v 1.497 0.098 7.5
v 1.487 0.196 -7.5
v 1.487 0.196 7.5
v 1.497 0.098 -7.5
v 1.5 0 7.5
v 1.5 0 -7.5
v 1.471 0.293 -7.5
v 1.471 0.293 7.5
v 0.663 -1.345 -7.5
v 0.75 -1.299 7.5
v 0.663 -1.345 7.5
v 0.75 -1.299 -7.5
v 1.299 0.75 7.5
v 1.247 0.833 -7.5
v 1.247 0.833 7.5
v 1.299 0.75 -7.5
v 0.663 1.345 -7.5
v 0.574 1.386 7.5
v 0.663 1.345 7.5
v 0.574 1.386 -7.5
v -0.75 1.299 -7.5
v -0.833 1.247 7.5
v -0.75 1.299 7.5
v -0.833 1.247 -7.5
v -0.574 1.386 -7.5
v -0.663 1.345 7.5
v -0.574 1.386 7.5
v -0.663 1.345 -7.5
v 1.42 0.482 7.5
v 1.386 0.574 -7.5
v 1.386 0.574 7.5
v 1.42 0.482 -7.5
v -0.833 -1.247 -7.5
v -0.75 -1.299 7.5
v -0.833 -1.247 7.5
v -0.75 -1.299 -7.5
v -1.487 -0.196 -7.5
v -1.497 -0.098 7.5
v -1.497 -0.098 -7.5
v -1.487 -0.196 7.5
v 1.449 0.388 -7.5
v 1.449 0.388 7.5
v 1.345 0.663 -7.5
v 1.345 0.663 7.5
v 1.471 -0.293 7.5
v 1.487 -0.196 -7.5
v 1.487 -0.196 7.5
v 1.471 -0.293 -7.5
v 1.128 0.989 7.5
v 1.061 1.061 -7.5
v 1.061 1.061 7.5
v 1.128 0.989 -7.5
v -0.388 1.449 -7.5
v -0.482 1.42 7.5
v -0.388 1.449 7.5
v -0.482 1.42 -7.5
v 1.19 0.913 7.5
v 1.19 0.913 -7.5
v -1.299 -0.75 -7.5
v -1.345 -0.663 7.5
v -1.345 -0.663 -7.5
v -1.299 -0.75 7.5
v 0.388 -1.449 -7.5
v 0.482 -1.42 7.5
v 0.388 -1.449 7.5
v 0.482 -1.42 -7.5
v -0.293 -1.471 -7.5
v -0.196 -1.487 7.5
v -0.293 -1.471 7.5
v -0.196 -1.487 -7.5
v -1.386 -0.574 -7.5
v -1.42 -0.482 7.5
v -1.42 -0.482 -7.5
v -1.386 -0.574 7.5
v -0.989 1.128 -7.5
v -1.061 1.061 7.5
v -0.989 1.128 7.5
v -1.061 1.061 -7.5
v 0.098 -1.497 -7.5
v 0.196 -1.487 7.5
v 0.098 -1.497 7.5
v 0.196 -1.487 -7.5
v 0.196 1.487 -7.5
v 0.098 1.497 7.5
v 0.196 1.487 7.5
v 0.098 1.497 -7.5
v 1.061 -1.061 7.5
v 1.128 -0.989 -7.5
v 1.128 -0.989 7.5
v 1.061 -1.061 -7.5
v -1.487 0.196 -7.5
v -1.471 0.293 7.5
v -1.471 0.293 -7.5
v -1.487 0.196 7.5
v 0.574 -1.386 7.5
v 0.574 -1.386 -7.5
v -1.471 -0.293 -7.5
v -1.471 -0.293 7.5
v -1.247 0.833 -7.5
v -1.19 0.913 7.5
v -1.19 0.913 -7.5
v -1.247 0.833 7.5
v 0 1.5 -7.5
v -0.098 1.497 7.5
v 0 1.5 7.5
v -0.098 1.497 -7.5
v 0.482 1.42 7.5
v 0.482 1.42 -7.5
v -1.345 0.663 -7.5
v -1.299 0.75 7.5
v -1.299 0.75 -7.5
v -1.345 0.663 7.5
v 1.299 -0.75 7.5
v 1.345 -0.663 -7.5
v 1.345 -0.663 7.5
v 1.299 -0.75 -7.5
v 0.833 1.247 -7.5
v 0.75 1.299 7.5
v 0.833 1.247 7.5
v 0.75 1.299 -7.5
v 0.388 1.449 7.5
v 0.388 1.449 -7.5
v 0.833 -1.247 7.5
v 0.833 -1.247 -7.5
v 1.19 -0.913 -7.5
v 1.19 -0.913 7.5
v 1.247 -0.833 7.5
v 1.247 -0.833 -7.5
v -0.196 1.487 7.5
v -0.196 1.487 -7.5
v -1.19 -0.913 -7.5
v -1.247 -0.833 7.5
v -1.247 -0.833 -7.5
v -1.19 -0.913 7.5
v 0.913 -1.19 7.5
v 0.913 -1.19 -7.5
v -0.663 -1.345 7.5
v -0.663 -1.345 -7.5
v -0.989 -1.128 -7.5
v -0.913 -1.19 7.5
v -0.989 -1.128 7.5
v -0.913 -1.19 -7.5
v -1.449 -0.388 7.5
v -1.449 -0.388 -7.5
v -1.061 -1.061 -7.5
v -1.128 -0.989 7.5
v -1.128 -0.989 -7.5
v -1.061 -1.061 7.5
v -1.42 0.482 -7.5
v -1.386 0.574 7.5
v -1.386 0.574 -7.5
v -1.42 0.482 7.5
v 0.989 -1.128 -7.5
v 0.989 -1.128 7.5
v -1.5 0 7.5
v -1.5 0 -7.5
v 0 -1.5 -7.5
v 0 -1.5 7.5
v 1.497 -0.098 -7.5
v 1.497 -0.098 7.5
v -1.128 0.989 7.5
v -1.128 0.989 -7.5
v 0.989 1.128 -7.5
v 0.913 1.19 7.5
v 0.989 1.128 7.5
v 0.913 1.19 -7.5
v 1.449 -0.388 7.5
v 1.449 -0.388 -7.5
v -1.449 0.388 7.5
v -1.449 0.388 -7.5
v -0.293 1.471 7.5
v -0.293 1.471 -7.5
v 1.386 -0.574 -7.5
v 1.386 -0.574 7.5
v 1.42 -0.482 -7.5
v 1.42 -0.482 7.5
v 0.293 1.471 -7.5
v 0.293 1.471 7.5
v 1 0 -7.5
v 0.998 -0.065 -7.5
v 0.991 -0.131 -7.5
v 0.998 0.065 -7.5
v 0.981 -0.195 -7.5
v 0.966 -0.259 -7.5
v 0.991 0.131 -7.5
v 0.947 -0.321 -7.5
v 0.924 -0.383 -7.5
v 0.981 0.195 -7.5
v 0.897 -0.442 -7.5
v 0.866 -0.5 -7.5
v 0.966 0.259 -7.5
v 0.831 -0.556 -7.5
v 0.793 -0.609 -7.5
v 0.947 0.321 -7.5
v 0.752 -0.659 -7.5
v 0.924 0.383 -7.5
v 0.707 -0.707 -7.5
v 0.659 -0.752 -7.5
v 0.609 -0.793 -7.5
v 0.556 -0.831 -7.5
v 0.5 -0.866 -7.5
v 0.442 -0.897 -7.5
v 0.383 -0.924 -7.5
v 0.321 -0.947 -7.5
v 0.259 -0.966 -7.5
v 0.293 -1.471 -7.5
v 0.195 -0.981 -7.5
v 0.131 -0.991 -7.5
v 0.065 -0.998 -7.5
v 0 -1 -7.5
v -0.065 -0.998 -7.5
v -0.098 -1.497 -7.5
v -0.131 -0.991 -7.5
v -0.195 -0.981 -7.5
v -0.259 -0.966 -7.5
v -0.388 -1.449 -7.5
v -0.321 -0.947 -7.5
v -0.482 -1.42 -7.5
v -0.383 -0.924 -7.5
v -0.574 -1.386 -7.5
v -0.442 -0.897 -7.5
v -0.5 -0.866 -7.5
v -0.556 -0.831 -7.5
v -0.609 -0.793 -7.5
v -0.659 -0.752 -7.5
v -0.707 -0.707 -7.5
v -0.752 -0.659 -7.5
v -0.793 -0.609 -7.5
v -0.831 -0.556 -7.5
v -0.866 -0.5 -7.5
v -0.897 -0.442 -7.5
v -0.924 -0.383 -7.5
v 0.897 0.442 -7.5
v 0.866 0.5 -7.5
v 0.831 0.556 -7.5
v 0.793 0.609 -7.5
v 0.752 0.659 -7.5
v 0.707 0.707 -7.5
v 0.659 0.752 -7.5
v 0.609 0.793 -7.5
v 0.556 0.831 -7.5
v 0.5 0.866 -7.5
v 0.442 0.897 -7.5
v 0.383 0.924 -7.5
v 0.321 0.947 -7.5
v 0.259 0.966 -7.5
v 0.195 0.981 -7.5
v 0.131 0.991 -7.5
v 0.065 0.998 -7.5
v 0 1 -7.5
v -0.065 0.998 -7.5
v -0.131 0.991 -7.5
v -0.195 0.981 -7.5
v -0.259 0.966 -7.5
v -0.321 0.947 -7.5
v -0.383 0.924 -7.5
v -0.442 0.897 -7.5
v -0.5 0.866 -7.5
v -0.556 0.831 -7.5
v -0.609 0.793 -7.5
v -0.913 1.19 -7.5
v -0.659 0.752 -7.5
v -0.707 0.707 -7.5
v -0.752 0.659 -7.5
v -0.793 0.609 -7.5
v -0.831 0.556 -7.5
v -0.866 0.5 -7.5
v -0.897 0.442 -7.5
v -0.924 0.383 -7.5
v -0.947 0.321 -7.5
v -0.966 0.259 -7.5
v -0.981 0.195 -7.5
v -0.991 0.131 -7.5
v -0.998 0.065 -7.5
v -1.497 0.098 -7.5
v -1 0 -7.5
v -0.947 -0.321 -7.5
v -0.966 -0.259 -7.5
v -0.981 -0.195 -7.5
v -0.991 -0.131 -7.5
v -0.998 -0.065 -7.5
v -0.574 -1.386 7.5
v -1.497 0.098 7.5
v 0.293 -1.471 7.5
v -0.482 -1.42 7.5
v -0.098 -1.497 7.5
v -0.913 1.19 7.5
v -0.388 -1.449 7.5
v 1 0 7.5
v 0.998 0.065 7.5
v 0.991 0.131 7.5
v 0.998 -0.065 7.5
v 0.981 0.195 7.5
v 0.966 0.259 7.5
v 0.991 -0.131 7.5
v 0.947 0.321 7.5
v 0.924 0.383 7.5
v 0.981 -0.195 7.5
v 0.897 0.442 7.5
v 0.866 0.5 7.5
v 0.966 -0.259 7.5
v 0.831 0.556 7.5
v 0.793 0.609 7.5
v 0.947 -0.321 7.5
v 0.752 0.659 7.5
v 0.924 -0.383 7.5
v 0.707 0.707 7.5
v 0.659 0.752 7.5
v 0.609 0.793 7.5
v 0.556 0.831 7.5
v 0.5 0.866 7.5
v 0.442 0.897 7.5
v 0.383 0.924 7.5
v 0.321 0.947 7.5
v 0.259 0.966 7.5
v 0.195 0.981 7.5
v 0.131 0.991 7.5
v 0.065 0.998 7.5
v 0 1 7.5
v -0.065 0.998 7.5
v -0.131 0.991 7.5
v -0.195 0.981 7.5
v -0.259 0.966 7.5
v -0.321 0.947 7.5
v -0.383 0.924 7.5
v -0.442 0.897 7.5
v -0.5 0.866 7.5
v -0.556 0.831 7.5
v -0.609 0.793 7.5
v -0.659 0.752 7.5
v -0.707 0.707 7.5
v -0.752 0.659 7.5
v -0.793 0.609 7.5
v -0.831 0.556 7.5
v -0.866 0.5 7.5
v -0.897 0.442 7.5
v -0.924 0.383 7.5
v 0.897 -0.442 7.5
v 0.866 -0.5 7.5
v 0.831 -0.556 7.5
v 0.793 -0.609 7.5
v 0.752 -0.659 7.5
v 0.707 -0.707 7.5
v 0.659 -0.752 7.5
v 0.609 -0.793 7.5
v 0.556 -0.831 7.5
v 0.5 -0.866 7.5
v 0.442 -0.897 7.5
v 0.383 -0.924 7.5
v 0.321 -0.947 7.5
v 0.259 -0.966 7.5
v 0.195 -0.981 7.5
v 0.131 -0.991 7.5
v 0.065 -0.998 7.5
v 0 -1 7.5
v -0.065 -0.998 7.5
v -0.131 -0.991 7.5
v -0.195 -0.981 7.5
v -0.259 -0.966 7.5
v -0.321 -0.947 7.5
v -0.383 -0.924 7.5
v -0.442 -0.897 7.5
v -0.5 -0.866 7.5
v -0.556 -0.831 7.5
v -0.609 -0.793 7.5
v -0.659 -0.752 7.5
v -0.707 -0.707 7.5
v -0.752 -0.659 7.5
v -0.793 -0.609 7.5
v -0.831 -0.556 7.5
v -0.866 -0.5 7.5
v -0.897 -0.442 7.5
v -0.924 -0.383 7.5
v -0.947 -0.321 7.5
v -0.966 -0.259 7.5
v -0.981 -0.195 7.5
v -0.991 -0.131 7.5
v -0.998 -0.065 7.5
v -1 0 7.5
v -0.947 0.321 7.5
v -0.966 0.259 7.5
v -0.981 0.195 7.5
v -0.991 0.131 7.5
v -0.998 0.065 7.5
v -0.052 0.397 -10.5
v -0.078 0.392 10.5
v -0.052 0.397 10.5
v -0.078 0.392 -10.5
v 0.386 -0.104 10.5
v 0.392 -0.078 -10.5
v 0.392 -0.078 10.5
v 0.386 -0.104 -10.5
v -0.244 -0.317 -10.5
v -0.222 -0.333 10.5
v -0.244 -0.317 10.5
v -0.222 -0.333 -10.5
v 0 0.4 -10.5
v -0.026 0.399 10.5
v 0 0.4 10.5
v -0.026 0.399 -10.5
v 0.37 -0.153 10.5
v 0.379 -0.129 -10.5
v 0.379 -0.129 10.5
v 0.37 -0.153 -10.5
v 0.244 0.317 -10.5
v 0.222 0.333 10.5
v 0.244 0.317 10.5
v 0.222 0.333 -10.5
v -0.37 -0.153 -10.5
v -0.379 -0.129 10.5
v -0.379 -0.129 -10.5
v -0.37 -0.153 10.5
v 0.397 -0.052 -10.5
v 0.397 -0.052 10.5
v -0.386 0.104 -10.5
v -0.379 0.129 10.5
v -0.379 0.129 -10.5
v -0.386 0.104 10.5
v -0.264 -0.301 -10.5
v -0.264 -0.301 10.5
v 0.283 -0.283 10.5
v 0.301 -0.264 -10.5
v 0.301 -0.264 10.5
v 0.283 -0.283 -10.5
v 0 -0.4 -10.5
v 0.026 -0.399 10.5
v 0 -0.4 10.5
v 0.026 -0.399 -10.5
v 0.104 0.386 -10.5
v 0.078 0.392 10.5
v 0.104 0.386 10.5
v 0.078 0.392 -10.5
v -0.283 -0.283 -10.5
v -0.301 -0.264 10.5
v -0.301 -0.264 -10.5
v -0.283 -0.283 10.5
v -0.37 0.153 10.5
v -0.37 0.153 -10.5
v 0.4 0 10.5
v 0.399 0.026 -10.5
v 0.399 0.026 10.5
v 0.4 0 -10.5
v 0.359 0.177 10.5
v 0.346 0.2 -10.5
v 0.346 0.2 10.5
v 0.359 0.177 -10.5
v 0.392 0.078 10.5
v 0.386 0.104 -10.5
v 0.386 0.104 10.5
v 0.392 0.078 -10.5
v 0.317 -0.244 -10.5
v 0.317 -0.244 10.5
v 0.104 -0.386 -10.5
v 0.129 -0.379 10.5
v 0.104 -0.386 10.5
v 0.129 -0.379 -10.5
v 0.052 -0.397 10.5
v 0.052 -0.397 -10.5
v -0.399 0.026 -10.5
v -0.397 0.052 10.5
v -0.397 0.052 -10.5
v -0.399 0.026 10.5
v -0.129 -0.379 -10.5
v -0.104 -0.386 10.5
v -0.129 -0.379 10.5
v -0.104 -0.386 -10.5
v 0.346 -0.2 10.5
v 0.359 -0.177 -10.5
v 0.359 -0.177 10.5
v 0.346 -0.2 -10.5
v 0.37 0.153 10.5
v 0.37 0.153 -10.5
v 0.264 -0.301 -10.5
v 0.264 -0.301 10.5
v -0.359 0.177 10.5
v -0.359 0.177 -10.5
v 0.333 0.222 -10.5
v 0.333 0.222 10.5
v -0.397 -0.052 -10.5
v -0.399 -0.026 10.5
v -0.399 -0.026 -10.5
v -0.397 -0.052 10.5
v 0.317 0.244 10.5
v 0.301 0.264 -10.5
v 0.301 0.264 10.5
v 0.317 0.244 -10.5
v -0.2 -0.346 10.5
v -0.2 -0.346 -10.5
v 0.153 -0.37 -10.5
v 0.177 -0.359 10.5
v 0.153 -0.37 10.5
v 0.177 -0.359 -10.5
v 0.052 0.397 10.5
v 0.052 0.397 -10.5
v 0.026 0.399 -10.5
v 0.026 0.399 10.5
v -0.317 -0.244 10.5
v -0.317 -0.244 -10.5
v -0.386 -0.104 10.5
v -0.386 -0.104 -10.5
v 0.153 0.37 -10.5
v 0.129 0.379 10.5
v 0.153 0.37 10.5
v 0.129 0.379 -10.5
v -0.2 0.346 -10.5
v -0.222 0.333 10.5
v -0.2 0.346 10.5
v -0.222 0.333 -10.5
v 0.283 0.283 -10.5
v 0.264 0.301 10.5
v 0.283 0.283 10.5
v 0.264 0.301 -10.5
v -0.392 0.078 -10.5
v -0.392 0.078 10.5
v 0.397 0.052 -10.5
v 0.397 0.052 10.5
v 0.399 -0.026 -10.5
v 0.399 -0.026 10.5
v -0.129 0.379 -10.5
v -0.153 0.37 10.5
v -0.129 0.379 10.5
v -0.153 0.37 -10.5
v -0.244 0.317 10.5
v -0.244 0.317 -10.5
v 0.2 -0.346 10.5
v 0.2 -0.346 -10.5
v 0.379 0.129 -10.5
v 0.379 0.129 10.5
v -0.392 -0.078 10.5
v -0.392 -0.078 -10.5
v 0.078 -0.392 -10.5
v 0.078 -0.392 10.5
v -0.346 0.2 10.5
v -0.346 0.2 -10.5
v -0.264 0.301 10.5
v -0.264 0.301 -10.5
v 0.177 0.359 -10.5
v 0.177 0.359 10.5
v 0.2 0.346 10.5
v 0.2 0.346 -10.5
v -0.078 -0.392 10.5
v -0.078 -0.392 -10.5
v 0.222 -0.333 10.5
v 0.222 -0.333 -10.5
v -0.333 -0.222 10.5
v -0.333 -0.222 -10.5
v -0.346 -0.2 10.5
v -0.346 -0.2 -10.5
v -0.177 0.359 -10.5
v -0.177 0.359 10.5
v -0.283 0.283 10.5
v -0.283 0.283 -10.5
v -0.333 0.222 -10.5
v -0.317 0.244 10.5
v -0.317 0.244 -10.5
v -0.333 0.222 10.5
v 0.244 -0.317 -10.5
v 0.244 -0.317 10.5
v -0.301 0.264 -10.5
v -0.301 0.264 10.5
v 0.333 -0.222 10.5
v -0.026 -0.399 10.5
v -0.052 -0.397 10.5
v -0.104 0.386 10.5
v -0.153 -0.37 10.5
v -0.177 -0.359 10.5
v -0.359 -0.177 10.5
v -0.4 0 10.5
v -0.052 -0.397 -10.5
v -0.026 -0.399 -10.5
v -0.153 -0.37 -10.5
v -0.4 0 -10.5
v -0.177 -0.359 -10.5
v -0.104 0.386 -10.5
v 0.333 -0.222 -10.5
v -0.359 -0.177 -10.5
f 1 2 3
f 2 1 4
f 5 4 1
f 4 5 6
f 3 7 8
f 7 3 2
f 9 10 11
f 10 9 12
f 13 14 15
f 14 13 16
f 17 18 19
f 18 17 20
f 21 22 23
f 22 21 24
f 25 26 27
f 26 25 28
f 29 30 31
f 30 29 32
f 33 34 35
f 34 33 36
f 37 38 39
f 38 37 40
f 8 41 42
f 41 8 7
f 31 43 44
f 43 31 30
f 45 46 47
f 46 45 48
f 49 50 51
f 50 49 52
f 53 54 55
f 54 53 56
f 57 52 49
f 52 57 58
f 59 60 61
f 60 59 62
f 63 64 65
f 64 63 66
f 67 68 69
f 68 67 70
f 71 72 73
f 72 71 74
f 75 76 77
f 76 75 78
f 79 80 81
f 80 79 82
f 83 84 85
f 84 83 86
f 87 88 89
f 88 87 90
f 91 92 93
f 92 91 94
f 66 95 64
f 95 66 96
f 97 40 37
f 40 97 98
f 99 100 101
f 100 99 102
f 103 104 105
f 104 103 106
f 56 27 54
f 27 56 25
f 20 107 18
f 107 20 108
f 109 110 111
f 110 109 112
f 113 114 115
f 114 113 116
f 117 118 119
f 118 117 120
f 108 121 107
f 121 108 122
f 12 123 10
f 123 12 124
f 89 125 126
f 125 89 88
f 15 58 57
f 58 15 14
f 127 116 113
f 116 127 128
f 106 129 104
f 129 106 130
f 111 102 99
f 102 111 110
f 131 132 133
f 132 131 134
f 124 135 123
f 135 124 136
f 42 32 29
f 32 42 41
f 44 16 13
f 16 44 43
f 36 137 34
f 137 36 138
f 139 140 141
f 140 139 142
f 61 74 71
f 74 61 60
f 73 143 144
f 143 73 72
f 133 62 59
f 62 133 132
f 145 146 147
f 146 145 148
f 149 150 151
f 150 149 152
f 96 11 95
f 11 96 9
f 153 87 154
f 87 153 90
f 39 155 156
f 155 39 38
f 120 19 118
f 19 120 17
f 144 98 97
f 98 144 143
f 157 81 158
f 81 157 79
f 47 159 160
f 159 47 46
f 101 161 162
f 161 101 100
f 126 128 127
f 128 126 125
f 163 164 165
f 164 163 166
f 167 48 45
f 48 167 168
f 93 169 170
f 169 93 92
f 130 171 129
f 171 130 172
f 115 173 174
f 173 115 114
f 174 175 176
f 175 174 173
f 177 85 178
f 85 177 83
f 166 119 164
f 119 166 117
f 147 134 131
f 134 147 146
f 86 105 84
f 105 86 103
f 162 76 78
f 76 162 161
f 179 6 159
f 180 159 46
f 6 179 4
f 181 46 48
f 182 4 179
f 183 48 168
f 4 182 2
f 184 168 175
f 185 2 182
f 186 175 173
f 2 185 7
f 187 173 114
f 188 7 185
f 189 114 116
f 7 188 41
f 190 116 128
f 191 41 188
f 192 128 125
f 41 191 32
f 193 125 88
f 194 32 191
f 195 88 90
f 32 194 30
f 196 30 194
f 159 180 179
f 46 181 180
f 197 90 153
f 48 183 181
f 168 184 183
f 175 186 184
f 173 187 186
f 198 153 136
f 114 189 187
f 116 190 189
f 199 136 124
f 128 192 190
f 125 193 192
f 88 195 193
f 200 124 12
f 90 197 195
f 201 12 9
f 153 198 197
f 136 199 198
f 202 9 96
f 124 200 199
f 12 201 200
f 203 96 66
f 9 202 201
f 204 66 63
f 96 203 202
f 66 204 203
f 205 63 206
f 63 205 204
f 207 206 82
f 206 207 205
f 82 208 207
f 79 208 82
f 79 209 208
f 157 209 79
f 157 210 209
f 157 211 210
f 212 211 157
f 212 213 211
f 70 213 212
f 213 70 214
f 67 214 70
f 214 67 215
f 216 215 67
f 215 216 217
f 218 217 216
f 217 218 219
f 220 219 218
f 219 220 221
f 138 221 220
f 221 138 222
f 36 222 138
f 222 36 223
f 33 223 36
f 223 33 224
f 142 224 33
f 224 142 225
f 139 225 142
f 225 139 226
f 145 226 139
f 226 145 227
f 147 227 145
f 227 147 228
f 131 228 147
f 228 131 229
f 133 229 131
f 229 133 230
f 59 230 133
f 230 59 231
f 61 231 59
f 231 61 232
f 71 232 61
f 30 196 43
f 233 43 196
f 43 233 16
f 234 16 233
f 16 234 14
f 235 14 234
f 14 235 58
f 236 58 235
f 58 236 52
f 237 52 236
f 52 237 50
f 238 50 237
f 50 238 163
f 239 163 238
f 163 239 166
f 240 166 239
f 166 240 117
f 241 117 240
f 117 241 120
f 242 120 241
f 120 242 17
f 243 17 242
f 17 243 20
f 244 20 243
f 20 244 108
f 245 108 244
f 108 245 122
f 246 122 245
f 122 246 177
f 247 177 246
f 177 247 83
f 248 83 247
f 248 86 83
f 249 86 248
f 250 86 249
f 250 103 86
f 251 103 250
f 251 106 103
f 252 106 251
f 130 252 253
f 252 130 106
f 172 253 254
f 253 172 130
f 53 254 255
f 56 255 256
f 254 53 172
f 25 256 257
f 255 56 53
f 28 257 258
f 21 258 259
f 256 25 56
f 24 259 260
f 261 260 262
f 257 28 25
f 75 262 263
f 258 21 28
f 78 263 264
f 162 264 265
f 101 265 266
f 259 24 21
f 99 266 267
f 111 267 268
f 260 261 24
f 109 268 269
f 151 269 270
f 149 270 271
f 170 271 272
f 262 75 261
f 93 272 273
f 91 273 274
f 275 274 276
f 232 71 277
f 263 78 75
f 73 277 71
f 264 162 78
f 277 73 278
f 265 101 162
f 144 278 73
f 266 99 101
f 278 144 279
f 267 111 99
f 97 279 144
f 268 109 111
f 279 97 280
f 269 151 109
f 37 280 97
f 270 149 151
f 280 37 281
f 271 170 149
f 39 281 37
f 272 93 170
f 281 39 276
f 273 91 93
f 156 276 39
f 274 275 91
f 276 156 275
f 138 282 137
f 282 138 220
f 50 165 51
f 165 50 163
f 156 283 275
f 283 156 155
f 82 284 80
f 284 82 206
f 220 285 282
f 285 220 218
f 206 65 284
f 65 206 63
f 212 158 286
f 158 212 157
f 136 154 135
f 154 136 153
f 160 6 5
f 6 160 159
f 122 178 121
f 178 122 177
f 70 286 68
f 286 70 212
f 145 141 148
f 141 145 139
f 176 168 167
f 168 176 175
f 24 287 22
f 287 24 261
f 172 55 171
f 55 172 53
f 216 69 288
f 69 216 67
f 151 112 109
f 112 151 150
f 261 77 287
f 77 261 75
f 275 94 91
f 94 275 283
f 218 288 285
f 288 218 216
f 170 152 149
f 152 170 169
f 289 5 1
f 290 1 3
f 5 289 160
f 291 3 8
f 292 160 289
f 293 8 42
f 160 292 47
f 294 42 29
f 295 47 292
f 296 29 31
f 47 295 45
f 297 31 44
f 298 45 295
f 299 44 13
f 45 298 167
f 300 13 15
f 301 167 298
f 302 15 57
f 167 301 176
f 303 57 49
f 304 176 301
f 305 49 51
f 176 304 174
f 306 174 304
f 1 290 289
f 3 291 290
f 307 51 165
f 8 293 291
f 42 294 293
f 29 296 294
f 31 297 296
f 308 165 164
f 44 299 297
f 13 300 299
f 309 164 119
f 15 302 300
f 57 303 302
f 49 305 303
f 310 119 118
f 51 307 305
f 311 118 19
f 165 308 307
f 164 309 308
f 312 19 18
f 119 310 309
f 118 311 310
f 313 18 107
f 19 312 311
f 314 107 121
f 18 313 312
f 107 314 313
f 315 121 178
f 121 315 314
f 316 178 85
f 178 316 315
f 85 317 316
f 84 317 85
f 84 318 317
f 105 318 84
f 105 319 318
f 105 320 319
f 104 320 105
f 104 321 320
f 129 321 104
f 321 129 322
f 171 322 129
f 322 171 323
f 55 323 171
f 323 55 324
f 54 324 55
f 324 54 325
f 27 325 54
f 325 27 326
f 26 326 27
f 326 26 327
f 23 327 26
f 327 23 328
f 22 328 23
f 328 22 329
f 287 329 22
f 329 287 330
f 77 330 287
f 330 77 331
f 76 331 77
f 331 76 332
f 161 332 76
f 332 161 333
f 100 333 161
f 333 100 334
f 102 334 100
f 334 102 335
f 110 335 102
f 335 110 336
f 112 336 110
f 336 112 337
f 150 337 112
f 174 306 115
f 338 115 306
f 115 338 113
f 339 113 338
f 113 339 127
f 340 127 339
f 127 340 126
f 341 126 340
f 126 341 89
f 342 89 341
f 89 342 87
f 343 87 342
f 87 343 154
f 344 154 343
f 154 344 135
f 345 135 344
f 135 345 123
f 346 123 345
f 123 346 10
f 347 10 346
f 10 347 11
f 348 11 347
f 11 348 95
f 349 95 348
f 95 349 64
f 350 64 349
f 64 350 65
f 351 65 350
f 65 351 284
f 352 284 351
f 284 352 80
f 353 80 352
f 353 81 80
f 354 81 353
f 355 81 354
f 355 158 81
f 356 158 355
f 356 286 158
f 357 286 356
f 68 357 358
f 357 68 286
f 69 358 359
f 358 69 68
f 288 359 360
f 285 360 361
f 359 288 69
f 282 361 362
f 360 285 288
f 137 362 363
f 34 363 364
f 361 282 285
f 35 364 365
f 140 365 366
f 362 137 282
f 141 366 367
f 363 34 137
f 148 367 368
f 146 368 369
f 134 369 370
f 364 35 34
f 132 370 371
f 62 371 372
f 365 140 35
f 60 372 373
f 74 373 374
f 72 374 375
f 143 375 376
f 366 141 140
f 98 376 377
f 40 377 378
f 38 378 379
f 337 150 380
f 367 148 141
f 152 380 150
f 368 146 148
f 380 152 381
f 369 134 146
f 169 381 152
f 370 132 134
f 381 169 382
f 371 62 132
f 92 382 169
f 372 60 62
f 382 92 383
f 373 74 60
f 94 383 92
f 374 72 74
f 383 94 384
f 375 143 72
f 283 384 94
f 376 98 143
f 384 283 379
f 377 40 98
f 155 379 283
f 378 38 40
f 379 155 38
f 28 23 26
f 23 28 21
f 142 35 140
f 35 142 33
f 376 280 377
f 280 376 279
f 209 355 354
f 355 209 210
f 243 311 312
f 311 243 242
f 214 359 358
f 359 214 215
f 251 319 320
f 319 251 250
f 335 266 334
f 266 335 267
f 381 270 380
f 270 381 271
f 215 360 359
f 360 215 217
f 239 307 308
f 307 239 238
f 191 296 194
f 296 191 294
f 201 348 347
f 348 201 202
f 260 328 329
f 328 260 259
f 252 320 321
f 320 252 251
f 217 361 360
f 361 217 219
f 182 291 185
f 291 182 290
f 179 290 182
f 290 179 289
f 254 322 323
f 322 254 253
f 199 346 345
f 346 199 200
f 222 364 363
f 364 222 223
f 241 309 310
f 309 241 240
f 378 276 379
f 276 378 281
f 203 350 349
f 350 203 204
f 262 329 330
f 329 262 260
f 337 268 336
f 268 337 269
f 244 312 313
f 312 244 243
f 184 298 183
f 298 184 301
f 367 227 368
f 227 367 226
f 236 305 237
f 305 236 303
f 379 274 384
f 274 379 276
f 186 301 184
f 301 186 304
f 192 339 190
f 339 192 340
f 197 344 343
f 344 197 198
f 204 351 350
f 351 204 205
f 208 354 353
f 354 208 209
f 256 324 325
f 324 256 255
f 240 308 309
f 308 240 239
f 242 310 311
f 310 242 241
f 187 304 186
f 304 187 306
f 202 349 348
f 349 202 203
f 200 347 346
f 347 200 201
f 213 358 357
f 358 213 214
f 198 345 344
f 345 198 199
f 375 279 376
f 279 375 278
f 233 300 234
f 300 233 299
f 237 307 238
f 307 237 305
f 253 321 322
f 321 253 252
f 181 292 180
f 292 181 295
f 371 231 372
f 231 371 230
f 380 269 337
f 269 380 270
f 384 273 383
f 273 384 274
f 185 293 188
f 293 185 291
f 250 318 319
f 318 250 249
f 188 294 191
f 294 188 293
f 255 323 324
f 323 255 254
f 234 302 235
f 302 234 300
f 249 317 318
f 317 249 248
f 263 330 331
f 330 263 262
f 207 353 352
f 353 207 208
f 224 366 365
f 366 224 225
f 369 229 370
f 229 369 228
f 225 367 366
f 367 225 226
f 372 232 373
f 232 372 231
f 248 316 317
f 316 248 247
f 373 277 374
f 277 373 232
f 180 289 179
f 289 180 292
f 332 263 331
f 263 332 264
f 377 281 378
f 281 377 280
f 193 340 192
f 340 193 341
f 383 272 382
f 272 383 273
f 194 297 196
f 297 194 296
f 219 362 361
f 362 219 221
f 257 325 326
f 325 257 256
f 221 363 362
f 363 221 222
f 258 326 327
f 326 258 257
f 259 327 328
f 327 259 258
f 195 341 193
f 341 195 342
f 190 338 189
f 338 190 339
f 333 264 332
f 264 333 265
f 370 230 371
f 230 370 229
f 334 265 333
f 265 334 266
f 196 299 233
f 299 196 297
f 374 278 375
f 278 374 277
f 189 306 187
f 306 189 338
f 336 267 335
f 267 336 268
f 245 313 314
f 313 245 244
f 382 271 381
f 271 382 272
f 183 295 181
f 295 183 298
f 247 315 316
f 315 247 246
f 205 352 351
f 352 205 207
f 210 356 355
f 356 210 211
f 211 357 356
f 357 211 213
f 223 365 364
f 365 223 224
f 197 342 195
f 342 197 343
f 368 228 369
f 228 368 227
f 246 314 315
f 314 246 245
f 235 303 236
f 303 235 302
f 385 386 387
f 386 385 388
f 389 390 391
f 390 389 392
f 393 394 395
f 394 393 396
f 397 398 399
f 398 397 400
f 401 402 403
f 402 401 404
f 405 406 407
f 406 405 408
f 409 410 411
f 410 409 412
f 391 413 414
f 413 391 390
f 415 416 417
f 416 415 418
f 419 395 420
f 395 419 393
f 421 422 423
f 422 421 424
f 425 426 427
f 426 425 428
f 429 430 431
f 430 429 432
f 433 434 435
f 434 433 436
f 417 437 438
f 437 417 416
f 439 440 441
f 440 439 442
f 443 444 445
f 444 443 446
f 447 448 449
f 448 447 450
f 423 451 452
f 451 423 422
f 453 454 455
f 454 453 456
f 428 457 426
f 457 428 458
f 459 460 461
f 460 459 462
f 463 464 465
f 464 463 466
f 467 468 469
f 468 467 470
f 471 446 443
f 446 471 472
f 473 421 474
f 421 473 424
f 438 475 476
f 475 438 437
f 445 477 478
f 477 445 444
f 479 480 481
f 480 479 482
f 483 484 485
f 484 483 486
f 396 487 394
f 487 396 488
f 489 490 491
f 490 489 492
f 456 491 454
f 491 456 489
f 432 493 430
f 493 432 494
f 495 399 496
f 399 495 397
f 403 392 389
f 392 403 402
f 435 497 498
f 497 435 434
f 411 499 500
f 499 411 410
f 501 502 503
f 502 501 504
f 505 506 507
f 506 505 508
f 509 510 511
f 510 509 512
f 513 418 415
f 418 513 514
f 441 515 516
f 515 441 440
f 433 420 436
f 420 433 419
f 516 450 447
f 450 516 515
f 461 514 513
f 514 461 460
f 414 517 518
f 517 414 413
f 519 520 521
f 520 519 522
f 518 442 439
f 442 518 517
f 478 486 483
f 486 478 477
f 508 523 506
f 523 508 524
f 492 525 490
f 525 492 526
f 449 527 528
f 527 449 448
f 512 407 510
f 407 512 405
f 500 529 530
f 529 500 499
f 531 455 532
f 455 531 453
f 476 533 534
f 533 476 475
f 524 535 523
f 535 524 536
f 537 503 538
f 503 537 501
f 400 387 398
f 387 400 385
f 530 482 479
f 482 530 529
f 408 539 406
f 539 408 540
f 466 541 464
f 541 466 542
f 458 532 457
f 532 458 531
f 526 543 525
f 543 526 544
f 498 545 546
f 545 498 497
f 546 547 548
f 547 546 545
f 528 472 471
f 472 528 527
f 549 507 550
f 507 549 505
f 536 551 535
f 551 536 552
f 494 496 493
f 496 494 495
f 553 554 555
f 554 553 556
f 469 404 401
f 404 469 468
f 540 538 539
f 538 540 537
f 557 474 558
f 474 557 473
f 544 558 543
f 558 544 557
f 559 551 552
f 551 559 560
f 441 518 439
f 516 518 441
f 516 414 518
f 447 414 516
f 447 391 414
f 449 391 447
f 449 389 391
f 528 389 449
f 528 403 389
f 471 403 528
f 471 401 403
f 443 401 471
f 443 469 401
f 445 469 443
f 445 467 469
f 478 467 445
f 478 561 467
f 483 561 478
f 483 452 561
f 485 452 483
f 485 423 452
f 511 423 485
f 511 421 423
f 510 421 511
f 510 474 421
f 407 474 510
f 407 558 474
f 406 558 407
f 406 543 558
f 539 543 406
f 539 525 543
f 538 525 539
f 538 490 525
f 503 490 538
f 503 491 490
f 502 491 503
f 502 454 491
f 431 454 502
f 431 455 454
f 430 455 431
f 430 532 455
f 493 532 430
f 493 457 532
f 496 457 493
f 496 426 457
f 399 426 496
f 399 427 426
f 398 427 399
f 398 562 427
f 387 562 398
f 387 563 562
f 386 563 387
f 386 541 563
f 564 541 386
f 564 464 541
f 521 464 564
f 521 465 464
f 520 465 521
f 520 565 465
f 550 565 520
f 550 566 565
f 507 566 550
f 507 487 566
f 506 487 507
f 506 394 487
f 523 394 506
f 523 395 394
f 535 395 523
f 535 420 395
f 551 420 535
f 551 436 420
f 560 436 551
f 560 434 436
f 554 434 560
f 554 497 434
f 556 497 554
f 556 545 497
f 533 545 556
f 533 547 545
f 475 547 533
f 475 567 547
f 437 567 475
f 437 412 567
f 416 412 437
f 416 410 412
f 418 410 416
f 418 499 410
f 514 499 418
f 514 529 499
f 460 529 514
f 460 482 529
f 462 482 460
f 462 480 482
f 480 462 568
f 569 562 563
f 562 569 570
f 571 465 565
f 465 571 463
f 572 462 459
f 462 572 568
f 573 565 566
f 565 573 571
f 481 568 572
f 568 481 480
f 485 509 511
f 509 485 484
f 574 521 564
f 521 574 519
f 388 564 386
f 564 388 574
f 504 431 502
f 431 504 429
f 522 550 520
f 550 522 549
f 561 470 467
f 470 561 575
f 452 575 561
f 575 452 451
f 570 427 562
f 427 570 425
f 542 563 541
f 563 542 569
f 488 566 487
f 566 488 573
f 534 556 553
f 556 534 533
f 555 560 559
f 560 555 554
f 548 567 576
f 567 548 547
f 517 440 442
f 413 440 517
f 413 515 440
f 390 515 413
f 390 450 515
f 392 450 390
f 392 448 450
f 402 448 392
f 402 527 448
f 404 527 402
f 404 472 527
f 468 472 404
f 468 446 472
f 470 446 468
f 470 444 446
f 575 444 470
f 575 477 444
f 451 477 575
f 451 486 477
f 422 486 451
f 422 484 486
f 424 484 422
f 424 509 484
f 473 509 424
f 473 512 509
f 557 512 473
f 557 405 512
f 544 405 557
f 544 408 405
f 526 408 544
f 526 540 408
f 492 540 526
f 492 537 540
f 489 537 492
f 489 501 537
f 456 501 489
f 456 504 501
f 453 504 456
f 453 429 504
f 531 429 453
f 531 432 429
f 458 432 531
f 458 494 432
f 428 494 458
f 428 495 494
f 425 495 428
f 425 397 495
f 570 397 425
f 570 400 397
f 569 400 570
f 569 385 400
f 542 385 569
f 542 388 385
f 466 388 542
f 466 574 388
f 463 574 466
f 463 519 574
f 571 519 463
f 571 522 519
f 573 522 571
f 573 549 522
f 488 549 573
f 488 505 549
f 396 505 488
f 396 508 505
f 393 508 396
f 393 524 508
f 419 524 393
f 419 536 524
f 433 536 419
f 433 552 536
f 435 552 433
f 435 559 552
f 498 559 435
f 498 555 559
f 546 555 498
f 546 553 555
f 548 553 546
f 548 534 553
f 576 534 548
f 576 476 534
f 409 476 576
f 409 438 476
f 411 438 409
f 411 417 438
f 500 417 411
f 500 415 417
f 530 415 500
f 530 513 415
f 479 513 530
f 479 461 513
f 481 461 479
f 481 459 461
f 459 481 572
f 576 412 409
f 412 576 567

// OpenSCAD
// PTFE heatshrink sleeving (hollow tube) with a lead passing through (one connected solid)

// Parameters
length = 15; //[8:30:1]
original_id = 2; //[1:6:0.1]
original_od = 3; //[1.5:9:0.1]
forced_id = 0; //[0:6:0.1]
center = 1; //[0:1:1]
overlap = 1; //[0.5:2:0.1]
lead_radius = 0.4; //[0.2:1:0.05]
lead_length = 6; //[3:15:1]

// Smooth cylinders (avoid faceted/pentagonal look)
$fn = 96;

// Derived dimensions
id = (forced_id > 0) ? forced_id : original_id;
od = original_od + (id - original_id);          // keep wall thickness consistent when forced_id changes
od_safe = max(od, id + 0.2);                    // ensure OD > ID
r_in = id / 2;
r_out = od_safe / 2;

// Z placement
z0 = (center > 0) ? 0 : length/2;

// Tubing (hollow)
module tubing() {
  color([0.85, 0.85, 0.8])  // off-white PTFE
  difference() {
    translate([0,0,z0]) cylinder(h=length, r=r_out, center=true);
    translate([0,0,z0]) cylinder(h=length + 2*overlap, r=r_in, center=true);
  }
}

// Lead through the bore (ensures ONE connected solid via overlap inside tube)
module lead_through() {
  color([0.2, 0.2, 0.2])
  translate([0,0,z0])
    cylinder(h=length + lead_length, r=lead_radius, center=true);
}

// Assembly: union makes a single connected solid
union() {
  tubing();
  lead_through();
}
